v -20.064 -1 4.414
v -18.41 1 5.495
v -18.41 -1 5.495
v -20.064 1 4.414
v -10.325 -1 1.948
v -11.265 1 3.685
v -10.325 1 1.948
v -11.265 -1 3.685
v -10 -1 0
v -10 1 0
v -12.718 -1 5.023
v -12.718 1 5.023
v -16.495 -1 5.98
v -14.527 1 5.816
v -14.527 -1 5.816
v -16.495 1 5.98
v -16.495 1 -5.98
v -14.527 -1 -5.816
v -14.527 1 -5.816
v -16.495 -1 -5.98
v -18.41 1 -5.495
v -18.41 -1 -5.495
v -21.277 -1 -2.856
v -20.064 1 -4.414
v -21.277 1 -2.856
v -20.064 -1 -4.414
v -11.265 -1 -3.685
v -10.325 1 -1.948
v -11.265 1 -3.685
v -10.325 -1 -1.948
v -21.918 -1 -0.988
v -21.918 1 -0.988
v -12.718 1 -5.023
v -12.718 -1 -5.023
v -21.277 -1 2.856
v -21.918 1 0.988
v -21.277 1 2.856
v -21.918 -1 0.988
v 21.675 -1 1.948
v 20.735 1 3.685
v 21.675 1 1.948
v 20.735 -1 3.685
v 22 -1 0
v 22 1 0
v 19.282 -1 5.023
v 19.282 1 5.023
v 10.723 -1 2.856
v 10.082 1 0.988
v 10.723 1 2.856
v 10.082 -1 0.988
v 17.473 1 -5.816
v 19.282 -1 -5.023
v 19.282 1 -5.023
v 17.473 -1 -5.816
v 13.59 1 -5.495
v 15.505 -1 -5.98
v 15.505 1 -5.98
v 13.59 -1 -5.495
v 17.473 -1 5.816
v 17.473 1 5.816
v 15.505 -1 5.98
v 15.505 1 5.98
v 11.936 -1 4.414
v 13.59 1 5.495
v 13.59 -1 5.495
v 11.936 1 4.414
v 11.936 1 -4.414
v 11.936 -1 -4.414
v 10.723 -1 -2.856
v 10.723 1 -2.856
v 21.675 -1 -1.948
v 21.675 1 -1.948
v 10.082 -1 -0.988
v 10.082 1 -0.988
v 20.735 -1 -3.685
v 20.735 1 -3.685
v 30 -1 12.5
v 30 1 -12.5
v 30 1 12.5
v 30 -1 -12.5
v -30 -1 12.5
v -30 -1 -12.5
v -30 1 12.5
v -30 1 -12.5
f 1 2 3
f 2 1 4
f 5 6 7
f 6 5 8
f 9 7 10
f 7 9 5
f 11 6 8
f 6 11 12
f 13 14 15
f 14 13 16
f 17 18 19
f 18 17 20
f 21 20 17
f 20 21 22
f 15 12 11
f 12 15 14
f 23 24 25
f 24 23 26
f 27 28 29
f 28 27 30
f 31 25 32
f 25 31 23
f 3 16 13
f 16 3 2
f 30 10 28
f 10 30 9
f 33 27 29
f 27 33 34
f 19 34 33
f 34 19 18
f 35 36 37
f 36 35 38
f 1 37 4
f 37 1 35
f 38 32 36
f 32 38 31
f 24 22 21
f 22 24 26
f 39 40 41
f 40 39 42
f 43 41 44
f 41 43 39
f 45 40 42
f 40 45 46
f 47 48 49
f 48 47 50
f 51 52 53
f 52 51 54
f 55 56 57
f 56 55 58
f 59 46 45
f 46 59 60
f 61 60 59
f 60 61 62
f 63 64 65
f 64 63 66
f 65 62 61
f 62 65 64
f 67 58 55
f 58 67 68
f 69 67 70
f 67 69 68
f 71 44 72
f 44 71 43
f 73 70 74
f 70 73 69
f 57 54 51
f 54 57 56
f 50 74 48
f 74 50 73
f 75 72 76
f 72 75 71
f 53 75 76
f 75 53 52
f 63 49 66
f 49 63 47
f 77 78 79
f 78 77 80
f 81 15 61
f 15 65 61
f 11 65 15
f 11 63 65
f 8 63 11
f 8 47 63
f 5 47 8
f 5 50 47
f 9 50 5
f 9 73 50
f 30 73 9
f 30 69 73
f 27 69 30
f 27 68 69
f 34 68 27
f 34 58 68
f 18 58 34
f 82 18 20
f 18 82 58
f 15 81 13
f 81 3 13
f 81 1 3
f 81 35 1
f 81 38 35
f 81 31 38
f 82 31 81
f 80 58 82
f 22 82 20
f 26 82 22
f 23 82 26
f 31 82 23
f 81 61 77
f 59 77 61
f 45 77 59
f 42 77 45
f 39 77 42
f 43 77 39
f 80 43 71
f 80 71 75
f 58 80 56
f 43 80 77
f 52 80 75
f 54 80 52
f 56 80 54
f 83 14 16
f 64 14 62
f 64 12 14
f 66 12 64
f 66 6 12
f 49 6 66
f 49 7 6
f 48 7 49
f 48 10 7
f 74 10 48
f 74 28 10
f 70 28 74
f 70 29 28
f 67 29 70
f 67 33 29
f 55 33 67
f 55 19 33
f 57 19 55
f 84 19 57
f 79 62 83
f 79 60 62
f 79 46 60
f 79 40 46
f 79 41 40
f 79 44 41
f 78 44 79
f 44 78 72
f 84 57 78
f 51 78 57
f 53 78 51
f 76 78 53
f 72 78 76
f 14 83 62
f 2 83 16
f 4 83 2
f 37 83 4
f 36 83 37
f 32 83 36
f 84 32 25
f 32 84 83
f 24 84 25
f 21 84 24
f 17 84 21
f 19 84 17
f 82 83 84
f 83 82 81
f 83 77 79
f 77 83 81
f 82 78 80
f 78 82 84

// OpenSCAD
// This is a plate with two 12-mm mounting holes for two tumblers (switch buttons)

back_mount_width  = 60;
back_mount_height = 25;
back_wheel_depth  = 2;
hole_dia          = 12;

module back_mount() {
  difference() {
    cube(size = [back_mount_width, back_mount_height, back_wheel_depth], center = true);
    offsets = [-16, 16];
    for (x = offsets) {
      translate([x, 0, 0]) {
        cylinder(10, r=hole_dia / 2, center=true);
      }
    }
  }
}
rotate([90, 0, 0]) {
  back_mount();
}
